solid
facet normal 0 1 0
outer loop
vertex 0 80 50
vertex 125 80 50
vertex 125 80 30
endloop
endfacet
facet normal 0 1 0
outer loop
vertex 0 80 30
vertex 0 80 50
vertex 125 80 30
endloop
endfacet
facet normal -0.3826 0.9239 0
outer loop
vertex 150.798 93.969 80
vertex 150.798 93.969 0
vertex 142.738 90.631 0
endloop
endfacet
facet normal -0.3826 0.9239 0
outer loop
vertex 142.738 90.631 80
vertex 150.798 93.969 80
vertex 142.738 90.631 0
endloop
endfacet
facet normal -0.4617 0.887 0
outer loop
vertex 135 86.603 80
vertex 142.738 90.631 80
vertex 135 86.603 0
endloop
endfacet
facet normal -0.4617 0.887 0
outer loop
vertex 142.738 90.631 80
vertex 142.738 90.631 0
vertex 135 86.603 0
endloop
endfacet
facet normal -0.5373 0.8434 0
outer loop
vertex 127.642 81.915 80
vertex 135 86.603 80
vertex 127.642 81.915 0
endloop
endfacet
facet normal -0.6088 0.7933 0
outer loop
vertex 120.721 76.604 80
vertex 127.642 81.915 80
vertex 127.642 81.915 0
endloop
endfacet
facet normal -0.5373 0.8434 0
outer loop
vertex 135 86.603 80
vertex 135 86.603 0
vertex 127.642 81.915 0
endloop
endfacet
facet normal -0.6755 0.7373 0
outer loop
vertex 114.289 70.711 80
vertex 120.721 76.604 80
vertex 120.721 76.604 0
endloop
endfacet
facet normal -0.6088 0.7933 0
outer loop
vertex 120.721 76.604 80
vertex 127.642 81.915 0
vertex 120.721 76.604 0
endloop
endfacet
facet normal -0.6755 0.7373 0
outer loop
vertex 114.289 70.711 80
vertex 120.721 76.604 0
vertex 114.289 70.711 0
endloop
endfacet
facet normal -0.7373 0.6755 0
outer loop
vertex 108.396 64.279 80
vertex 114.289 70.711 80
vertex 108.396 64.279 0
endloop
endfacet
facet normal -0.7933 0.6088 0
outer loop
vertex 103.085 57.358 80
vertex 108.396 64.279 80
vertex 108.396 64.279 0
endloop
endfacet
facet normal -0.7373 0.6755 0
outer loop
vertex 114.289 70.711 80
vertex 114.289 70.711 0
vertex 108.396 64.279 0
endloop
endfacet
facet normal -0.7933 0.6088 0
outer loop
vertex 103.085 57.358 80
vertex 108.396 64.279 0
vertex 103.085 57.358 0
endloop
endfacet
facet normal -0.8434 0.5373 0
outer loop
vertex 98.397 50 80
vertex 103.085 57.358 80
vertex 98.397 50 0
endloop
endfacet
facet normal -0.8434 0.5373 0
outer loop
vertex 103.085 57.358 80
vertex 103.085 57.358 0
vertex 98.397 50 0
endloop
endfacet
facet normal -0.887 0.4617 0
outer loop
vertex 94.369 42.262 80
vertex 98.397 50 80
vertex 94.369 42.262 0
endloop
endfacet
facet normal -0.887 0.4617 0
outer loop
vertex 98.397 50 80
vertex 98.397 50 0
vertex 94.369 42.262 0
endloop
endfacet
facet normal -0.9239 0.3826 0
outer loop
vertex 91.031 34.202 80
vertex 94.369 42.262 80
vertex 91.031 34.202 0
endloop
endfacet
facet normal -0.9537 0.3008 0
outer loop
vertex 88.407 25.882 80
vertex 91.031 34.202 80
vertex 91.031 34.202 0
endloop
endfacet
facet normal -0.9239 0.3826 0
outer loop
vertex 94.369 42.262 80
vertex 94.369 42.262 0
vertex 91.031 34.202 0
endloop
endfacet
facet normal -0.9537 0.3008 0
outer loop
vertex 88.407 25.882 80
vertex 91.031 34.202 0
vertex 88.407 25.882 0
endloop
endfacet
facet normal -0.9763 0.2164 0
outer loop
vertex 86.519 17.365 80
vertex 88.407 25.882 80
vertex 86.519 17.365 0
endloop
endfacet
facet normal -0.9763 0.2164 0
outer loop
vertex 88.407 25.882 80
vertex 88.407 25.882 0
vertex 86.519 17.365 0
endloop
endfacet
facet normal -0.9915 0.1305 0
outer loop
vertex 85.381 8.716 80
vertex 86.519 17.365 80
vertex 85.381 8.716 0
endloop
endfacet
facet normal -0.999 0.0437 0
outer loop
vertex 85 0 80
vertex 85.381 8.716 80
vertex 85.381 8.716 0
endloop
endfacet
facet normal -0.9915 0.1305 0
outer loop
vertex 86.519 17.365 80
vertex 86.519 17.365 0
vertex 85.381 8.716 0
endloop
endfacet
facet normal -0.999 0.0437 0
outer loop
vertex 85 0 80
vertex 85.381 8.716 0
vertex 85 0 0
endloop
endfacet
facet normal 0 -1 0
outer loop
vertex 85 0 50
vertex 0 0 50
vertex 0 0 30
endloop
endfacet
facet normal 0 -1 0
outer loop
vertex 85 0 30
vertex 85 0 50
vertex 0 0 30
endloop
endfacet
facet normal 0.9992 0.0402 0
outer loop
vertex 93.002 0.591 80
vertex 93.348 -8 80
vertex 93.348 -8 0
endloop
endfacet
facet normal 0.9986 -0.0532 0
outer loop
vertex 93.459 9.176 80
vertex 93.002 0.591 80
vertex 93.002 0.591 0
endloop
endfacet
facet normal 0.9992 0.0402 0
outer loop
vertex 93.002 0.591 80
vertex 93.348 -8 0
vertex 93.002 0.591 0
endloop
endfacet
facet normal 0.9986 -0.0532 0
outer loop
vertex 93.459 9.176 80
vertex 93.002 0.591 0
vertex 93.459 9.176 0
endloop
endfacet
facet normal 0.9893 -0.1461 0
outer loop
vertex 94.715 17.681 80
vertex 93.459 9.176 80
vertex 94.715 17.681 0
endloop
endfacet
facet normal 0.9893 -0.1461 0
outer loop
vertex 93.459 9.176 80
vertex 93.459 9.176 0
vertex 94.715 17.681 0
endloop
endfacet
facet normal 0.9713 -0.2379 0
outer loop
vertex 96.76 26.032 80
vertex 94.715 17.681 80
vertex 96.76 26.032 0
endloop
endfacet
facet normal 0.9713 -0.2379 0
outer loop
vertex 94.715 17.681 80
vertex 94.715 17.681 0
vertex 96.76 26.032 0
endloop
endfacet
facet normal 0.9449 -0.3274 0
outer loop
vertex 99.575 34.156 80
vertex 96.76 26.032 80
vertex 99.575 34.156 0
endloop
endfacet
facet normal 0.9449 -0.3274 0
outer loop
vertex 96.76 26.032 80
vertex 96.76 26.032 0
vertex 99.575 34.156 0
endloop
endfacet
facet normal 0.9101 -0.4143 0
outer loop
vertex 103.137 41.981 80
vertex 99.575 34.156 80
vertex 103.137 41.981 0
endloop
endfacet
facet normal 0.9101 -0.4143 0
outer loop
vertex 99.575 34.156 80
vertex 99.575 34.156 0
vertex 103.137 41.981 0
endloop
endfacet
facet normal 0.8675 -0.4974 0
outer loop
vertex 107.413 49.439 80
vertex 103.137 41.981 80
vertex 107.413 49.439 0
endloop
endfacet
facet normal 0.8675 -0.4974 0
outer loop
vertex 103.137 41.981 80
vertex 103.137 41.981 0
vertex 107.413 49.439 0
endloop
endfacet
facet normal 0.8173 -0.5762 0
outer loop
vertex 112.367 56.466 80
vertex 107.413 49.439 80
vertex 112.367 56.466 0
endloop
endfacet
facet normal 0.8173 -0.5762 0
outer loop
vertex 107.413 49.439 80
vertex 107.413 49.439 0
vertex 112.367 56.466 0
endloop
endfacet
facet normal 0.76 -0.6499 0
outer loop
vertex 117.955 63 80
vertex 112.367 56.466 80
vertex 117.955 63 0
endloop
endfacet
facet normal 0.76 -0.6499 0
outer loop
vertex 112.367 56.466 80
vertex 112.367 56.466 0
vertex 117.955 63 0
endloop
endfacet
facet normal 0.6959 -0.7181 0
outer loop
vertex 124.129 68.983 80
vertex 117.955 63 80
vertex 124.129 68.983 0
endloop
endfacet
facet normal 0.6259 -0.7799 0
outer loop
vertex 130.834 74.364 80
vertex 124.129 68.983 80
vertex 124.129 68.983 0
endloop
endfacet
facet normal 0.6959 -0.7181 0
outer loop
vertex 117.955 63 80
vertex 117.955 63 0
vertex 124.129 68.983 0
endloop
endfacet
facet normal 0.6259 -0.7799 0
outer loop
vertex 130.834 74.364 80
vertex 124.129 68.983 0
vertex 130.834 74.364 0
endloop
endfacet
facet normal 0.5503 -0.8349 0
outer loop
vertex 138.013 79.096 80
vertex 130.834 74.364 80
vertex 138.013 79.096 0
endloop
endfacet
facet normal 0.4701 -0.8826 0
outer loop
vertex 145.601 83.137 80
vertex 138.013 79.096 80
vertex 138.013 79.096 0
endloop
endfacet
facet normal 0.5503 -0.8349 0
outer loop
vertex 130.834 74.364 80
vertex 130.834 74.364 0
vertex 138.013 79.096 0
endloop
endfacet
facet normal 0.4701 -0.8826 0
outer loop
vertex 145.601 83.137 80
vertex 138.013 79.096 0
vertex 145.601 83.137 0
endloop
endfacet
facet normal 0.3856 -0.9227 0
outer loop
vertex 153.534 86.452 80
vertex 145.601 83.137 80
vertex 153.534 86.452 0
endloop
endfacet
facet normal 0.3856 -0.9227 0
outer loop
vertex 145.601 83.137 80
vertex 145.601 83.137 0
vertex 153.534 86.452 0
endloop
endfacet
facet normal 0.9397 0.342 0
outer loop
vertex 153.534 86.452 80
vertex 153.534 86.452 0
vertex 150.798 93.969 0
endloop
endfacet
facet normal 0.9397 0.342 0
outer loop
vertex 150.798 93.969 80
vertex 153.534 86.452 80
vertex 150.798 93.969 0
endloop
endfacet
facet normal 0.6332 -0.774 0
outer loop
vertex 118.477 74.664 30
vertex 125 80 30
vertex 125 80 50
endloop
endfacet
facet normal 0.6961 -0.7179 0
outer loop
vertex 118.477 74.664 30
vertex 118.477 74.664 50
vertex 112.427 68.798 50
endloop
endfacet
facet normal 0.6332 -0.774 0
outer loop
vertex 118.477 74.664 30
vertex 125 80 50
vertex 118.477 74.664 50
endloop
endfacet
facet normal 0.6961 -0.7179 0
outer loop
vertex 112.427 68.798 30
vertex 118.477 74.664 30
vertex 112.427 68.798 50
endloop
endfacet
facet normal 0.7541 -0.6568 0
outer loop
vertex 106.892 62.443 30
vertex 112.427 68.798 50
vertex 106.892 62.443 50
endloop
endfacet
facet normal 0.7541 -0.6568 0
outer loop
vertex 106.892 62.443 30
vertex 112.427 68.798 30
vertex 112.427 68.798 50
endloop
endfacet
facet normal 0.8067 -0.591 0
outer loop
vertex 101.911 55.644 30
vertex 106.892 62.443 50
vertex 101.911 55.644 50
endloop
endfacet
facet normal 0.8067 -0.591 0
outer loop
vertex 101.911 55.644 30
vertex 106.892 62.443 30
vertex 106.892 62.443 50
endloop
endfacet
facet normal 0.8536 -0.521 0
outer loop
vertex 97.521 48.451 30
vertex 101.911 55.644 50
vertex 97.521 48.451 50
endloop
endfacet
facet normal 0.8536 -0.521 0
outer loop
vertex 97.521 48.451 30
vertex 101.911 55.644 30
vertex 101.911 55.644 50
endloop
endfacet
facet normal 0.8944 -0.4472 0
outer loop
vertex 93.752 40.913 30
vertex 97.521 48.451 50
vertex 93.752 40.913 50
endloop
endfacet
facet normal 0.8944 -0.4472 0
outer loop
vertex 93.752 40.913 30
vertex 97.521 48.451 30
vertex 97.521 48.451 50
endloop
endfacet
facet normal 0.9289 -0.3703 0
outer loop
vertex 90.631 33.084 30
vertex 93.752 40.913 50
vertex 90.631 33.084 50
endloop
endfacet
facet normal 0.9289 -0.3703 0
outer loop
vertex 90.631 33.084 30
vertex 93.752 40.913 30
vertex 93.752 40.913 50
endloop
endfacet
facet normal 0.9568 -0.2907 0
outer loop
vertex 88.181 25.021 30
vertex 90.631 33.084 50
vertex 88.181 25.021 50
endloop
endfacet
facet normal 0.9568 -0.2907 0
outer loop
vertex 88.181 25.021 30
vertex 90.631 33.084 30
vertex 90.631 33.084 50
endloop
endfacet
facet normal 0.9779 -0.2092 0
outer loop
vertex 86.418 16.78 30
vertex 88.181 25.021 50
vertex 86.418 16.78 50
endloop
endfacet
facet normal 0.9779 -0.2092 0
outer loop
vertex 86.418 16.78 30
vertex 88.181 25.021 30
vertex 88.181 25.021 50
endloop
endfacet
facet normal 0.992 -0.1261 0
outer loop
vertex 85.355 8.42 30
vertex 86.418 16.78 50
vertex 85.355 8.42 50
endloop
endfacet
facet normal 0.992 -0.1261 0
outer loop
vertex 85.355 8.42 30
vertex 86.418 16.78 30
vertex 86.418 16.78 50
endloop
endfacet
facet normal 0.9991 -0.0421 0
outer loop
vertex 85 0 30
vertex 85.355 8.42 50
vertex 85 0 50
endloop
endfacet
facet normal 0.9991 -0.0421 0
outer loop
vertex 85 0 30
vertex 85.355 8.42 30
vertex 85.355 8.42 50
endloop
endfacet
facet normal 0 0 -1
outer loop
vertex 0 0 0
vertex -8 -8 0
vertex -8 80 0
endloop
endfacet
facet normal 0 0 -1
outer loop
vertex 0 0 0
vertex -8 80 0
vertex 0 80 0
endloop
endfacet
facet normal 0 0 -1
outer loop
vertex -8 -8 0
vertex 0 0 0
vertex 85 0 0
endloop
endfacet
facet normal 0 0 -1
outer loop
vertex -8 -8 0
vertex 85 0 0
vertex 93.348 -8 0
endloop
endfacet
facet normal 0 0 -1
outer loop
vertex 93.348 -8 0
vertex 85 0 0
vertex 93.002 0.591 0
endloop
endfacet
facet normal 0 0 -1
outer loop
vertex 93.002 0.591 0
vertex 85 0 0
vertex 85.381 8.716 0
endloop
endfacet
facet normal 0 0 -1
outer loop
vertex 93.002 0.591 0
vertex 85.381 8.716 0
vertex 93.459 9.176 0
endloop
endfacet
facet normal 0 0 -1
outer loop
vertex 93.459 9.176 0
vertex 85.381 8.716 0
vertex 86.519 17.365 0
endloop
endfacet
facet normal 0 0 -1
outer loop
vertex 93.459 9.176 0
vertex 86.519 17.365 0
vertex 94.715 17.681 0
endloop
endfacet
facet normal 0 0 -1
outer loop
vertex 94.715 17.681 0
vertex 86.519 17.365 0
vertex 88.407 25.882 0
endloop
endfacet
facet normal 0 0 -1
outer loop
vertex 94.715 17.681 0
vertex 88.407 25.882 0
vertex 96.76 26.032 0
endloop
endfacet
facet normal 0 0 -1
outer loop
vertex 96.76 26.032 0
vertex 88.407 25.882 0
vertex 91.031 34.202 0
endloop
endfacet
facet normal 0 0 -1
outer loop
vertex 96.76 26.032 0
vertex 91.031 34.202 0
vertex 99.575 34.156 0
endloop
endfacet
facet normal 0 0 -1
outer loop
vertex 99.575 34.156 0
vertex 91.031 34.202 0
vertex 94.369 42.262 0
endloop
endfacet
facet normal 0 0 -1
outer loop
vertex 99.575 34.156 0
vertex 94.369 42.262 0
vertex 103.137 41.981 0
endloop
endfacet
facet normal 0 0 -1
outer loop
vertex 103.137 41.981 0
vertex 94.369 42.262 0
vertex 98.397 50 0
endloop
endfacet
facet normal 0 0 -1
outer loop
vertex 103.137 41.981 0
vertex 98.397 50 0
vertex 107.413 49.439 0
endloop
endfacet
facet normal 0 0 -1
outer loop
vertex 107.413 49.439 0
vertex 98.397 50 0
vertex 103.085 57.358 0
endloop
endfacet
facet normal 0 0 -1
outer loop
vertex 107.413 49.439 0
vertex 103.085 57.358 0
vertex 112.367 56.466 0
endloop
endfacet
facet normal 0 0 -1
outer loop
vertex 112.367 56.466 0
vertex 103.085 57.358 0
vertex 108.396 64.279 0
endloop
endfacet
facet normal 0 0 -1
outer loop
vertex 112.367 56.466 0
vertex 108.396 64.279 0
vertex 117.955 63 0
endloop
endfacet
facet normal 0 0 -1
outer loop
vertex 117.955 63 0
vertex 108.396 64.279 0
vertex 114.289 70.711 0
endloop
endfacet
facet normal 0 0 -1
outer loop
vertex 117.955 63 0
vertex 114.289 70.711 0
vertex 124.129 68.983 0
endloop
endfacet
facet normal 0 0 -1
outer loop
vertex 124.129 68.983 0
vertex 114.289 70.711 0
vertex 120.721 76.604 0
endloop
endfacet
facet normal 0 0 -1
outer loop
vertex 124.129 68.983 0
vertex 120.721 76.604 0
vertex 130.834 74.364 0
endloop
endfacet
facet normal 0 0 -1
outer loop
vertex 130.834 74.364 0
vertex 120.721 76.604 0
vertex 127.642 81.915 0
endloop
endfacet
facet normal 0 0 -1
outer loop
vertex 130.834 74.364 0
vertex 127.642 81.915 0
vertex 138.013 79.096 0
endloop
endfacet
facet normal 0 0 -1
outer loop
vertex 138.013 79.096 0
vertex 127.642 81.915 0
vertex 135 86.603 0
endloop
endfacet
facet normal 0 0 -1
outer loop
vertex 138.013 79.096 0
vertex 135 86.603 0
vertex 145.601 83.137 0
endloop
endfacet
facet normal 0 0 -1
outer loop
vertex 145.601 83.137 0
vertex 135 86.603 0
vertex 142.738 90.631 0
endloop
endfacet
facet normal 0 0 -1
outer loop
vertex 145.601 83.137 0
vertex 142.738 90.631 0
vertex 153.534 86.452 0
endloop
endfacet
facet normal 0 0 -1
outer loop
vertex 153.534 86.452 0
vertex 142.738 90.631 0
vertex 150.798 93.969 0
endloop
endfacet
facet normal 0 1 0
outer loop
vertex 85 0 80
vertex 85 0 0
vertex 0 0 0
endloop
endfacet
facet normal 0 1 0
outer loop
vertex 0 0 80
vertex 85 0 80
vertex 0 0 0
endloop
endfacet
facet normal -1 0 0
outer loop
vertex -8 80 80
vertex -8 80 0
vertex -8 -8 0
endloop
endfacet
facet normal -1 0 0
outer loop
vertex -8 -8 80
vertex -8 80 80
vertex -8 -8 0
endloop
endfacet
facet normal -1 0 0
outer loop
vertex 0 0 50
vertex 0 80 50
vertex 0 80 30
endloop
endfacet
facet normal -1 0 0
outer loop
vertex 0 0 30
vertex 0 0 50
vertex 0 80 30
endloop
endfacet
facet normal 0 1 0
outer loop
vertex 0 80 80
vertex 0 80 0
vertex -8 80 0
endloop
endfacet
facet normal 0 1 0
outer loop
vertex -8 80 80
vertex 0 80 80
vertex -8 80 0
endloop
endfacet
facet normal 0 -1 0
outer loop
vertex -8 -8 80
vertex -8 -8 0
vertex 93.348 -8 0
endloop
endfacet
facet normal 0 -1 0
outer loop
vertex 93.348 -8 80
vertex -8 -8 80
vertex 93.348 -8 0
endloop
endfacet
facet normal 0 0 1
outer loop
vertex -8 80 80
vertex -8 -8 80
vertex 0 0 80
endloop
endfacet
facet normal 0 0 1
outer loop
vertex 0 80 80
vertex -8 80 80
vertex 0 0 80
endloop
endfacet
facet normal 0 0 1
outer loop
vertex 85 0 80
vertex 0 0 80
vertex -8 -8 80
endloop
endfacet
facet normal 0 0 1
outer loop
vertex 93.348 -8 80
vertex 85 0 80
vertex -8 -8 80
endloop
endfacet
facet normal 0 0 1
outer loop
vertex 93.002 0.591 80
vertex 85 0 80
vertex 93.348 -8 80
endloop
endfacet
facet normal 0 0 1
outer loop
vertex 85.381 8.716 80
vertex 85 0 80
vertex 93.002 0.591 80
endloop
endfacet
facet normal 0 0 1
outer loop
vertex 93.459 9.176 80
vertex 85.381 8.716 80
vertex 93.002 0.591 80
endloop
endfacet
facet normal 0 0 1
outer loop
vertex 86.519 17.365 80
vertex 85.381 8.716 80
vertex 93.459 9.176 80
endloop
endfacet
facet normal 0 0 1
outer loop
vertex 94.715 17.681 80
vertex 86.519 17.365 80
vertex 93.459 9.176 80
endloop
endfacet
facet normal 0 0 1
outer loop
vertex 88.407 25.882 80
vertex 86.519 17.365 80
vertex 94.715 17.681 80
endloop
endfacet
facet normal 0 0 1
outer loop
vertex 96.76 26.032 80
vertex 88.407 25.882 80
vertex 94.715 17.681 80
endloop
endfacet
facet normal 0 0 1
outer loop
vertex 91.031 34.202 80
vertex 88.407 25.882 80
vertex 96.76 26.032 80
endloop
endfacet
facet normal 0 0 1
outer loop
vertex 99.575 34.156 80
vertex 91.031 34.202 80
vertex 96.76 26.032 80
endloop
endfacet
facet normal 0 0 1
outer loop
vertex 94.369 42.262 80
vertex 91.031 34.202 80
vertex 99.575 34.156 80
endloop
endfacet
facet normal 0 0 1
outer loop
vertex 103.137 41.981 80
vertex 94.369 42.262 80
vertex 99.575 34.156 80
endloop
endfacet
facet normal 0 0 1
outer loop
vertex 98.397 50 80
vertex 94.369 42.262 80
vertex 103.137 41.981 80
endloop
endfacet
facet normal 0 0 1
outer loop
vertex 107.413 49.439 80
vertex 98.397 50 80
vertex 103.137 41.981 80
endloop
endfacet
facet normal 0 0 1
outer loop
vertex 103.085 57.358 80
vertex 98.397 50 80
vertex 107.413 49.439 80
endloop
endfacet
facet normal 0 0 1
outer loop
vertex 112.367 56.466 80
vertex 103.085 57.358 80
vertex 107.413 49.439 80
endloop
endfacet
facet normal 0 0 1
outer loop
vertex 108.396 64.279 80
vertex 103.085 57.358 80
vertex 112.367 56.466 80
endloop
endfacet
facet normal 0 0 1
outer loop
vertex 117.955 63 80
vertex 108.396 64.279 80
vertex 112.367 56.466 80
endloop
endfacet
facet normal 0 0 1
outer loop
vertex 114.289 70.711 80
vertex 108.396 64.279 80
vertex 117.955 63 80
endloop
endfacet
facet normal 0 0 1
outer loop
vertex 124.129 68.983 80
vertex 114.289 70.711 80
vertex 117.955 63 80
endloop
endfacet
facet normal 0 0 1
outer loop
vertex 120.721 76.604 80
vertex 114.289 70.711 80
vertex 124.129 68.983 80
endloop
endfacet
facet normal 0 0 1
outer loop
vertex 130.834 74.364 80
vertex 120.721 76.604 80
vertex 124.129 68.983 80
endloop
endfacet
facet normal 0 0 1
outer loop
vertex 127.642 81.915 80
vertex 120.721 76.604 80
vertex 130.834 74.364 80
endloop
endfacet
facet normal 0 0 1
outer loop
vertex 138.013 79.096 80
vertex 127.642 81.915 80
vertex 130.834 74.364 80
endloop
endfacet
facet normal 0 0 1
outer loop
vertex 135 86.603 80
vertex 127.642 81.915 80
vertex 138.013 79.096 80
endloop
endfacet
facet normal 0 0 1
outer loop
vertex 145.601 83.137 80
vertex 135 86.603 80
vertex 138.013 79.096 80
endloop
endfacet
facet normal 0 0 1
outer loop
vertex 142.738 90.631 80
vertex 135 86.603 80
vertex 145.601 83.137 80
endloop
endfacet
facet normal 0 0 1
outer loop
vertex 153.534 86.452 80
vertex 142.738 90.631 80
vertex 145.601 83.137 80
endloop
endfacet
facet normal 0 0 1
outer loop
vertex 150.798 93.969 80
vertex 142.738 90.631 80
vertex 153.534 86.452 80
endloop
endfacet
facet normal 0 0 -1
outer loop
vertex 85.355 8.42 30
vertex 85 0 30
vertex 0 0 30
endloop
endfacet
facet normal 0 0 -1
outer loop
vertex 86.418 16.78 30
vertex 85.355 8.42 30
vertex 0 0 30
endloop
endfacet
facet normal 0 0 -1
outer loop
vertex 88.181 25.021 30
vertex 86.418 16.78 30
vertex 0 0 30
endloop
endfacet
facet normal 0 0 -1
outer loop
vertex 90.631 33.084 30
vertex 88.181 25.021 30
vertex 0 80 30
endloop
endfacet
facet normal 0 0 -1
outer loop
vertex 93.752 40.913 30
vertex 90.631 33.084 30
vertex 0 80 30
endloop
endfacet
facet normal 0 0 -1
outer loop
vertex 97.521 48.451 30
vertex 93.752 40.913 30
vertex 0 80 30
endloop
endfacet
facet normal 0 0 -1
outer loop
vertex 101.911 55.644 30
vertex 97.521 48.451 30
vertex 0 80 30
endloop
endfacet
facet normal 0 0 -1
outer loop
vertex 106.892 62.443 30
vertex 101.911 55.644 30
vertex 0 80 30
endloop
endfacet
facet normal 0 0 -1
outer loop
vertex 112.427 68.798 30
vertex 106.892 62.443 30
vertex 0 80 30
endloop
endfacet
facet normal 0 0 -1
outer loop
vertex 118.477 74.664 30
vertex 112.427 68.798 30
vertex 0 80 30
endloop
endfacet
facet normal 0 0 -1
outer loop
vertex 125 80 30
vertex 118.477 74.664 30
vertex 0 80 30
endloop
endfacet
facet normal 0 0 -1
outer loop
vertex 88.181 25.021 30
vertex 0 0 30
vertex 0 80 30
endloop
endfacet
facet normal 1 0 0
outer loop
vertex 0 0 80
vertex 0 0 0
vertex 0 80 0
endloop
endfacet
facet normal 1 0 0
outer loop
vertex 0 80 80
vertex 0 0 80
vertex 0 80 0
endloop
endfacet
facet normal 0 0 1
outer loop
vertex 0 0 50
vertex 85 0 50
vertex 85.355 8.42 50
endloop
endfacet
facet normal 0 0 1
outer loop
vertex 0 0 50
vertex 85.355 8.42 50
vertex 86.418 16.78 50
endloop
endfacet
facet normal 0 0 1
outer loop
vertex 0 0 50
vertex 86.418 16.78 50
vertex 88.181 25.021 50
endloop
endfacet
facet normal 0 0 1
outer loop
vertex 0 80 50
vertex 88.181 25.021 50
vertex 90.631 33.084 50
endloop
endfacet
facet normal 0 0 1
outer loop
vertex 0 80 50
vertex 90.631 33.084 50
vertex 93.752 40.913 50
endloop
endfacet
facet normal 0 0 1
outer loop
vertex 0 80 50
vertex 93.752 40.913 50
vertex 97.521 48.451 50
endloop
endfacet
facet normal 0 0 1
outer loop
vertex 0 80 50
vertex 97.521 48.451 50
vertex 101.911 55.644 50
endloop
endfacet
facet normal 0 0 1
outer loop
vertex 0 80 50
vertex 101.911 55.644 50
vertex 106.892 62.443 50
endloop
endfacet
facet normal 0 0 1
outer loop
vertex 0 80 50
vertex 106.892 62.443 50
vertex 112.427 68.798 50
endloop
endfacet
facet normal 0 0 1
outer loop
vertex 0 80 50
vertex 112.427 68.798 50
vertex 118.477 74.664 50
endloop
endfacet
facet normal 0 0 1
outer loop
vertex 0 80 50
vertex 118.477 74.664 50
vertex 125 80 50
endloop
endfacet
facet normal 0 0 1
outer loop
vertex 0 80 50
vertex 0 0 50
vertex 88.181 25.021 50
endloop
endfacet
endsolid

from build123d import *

# Parameters (mm, degrees)
EXTRUDE_THIN1_DEPTH = 80
BOSS_EXTRUDE2_REACH = 155.534
SKETCH2_W           = 20
SKETCH2_H           = 80


with BuildPart() as part:
    # Sketch1 → Extrude-Thin1 (new body)
    with BuildSketch(Plane.XY):
        with BuildLine():
            ThreePointArc((150.797985667, 93.969262079), (103.084795571, 57.357643635), (85, 0))
            Line((85, 0), (0, 0))
            Line((0, 0), (0, 80))
            Line((0, 80), (-8, 80))
            Line((-8, 80), (-8, -8))
            Line((-8, -8), (93.348486101, -8))
            ThreePointArc((93.348486101, -8), (107.412930041, 49.439322156), (153.534146814, 86.451721112))
            Line((153.534146814, 86.451721112), (150.797985667, 93.969262079))
        make_face()
    extrude(amount=EXTRUDE_THIN1_DEPTH)


with BuildPart() as body_2:

    # Sketch2 → Boss-Extrude2 (new body, up to next)
    with BuildSketch(Plane(origin=(0, 0, 0), x_dir=(0, 0, -1), z_dir=(1, 0, 0)), mode=Mode.PRIVATE) as boss_extrude2_sk1:
        with Locations((-40, 40)):
            Rectangle(SKETCH2_W, SKETCH2_H)
    boss_extrude2_tool1 = extrude(boss_extrude2_sk1.sketch, amount=BOSS_EXTRUDE2_REACH, mode=Mode.PRIVATE) - part.part
    add(boss_extrude2_tool1.solids().sort_by_distance((0, 40, 40))[0])


solid = Compound([part.part, body_2.part])
